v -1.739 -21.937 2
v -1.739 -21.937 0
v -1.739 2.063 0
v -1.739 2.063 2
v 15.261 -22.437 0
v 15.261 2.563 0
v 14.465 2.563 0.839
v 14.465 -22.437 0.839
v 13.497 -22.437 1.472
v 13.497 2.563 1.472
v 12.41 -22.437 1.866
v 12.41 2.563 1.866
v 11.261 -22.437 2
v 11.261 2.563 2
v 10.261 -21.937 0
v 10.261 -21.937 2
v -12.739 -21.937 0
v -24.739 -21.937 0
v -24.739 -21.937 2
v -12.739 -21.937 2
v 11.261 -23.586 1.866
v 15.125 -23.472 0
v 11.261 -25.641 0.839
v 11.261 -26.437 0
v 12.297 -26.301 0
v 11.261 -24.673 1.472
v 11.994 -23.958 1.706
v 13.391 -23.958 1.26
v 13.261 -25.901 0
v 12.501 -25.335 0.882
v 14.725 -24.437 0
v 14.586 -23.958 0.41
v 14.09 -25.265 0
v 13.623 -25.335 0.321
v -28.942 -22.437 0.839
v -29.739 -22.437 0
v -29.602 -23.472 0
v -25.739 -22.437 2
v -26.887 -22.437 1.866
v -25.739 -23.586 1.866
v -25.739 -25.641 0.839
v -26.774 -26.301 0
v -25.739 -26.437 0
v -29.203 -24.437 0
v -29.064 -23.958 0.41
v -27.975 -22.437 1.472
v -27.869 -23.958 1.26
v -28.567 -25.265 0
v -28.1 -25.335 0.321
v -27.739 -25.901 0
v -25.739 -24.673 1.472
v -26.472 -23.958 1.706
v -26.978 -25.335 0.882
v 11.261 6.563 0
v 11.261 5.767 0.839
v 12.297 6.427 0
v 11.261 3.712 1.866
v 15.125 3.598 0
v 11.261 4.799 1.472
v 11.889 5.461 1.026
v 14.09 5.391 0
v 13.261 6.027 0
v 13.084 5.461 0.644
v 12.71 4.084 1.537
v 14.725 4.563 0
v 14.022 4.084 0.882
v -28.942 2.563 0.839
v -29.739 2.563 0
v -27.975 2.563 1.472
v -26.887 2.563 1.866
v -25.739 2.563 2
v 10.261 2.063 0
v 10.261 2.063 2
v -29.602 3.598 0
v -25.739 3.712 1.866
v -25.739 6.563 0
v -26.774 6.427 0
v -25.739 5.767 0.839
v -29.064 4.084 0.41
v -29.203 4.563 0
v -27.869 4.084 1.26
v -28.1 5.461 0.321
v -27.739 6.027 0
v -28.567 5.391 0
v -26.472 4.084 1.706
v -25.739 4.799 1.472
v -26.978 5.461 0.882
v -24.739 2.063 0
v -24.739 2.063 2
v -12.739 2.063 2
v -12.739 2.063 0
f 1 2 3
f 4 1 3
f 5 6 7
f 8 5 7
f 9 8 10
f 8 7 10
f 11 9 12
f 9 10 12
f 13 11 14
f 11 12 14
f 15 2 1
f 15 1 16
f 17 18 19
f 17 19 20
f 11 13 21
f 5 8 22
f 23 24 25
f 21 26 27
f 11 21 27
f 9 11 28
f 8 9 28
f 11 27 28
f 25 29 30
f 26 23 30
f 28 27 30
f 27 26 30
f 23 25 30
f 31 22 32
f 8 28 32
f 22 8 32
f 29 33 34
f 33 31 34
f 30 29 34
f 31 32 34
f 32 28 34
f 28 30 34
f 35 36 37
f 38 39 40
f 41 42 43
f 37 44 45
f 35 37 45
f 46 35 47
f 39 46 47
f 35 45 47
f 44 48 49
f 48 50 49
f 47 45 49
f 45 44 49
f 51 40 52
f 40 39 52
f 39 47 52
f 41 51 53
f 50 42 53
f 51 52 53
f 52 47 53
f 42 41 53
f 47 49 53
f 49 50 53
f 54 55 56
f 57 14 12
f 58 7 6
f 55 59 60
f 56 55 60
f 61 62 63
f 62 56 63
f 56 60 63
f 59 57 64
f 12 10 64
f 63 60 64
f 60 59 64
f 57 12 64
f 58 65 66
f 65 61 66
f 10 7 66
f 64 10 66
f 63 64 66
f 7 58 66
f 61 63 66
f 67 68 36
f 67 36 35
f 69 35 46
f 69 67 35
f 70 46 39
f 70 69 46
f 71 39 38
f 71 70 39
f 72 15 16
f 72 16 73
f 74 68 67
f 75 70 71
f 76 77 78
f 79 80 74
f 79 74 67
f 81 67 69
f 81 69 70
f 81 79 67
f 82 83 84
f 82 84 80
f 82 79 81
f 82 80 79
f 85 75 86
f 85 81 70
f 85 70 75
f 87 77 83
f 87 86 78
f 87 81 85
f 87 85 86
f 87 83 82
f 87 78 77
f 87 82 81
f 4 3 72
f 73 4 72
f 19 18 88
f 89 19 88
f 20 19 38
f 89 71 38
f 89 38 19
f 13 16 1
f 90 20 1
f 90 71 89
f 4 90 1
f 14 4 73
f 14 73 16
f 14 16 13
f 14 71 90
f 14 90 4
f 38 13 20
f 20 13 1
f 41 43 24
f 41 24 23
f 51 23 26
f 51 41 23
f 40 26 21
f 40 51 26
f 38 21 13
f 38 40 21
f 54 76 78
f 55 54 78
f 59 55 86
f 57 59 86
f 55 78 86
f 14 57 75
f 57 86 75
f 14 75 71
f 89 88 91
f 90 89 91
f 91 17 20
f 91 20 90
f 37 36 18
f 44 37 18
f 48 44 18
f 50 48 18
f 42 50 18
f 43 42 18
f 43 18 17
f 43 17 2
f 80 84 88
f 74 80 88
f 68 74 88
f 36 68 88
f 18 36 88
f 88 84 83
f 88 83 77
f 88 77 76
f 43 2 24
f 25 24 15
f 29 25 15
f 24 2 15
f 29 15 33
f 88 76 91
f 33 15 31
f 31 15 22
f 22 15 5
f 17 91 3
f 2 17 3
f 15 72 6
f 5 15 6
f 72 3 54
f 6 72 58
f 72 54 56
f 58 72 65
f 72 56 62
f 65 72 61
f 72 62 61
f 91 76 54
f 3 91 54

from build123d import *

# Parameters (mm, degrees)
F1_W        = 45
F1_H        = 35
F1_W_2      = 12
F1_H_2      = 24
F2_DEPTH    = 2
F3_T1_DEPTH = 55
F4_T1_DEPTH = 55
F5_T1_DEPTH = 37
F5_T4_ANGLE = 196.3896000127
F5_T6_ANGLE = 196.3896000127
F6_T1_DEPTH = 37
F6_T4_ANGLE = 196.3896000127
F6_T6_ANGLE = 196.3896000127


# Not quite as in the source:
# - a fillet or chamfer that OpenCascade refuses, or shapes differently, is made with other operations: its cross-section is extruded or revolved along the edge and cut away or added


with BuildPart() as f2:
    # F1 (on face) → F2 (new body)
    with BuildSketch(Plane.XY):
        with Locations((-7.2387225181, -9.9369412684)):
            Rectangle(F1_W, F1_H)
        with Locations((-18.7387225181, -9.9369412684)):
            Rectangle(F1_W_2, F1_H_2, mode=Mode.SUBTRACT)
        with Locations((4.2612774819, -9.9369412684)):
            Rectangle(F1_W_2, F1_H_2, mode=Mode.SUBTRACT)
    extrude(amount=F2_DEPTH)

    # F3: fillet of radius 5 on 1 edges, made by hand

    # F3_s2 → F3_t1 (cut)
    with BuildSketch(Plane.XZ.offset(-17.5630587316)):
        with BuildLine():
            ThreePointArc((-29.7387225181, 0), (-27.9747904956, 1.472135955), (-25.7387225181, 2))
            Line((-25.7387225181, 2), (-29.7387225181, 2))
            Line((-29.7387225181, 2), (-29.7387225181, 0))
        make_face()
    extrude(amount=F3_T1_DEPTH, mode=Mode.SUBTRACT)

    # F4: fillet of radius 5 on 1 edges, made by hand

    # F4_s2 → F4_t1 (cut)
    with BuildSketch(Plane.XZ.offset(-17.5630587316)):
        with BuildLine():
            ThreePointArc((15.2612774819, 0), (13.4973454594, 1.472135955), (11.2612774819, 2))
            Line((11.2612774819, 2), (15.2612774819, 2))
            Line((15.2612774819, 2), (15.2612774819, 0))
        make_face()
    extrude(amount=F4_T1_DEPTH, mode=Mode.SUBTRACT)

    # F5: fillet of radius 5 on 1 edges, made by hand

    # F5_s2 → F5_t1 (cut)
    with BuildSketch(Plane.YZ.offset(-25.7387225181)):
        with BuildLine():
            ThreePointArc((-27.4369412684, -3), (-25.9724751743, 0.5355339059), (-22.4369412684, 2))
            Line((-22.4369412684, 2), (-27.4369412684, 2))
            Line((-27.4369412684, 2), (-27.4369412684, -3))
        make_face()
    extrude(amount=F5_T1_DEPTH, mode=Mode.SUBTRACT)

    # F5_s3 → F5_t4 (revolve, cut)
    with BuildSketch(Plane(origin=(-24.5015511946, 0, -7.2063663149), x_dir=(0, 1, 0), z_dir=(0.9593652077, 0, 0.2821673233))):
        with BuildLine():
            ThreePointArc((-22.4369412684, -0.615469186), (-25.9724751743, 0.848996908), (-27.4369412684, 4.384530814))
            Line((-27.4369412684, 4.384530814), (-27.4369412684, -0.615469186))
            Line((-27.4369412684, -0.615469186), (-22.4369412684, -0.615469186))
        make_face()
    revolve(axis=Axis((-25.7387225181, -27.4369412684, -3), (0, 1, 0)), revolution_arc=F5_T4_ANGLE, mode=Mode.SUBTRACT)

    # F5_s5 → F5_t6 (revolve, cut)
    with BuildSketch(Plane.YZ.offset(11.2612774819)):
        with BuildLine():
            ThreePointArc((-22.4369412684, 2), (-25.9724751743, 0.5355339059), (-27.4369412684, -3))
            Line((-27.4369412684, -3), (-27.4369412684, 2))
            Line((-27.4369412684, 2), (-22.4369412684, 2))
        make_face()
    revolve(axis=Axis((11.2612774819, -27.4369412684, -3), (0, 1, 0)), revolution_arc=F5_T6_ANGLE, mode=Mode.SUBTRACT)

    # F6: fillet of radius 5 on 1 edges, made by hand

    # F6_s2 → F6_t1 (cut)
    with BuildSketch(Plane.YZ.offset(-25.7387225181)):
        with BuildLine():
            ThreePointArc((7.5630587316, -3), (6.0985926376, 0.5355339059), (2.5630587316, 2))
            Line((2.5630587316, 2), (7.5630587316, 2))
            Line((7.5630587316, 2), (7.5630587316, -3))
        make_face()
    extrude(amount=F6_T1_DEPTH, mode=Mode.SUBTRACT)

    # F6_s3 → F6_t4 (revolve, cut)
    with BuildSketch(Plane.YZ.offset(11.2612774819)):
        with BuildLine():
            ThreePointArc((7.5630587316, -3), (6.0985926376, 0.5355339059), (2.5630587316, 2))
            Line((2.5630587316, 2), (7.5630587316, 2))
            Line((7.5630587316, 2), (7.5630587316, -3))
        make_face()
    revolve(axis=Axis((11.2612774819, 7.5630587316, -3), (0, 1, 0)), revolution_arc=F6_T4_ANGLE, mode=Mode.SUBTRACT)

    # F6_s5 → F6_t6 (revolve, cut)
    with BuildSketch(Plane(origin=(-24.5015511946, 0, -7.2063663149), x_dir=(0, 1, 0), z_dir=(0.9593652077, 0, 0.2821673233))):
        with BuildLine():
            ThreePointArc((2.5630587316, -0.615469186), (6.0985926376, 0.848996908), (7.5630587316, 4.384530814))
            Line((7.5630587316, 4.384530814), (7.5630587316, -0.615469186))
            Line((7.5630587316, -0.615469186), (2.5630587316, -0.615469186))
        make_face()
    revolve(axis=Axis((-25.7387225181, 7.5630587316, -3), (0, 1, 0)), revolution_arc=F6_T6_ANGLE, mode=Mode.SUBTRACT)


solid = f2.part
